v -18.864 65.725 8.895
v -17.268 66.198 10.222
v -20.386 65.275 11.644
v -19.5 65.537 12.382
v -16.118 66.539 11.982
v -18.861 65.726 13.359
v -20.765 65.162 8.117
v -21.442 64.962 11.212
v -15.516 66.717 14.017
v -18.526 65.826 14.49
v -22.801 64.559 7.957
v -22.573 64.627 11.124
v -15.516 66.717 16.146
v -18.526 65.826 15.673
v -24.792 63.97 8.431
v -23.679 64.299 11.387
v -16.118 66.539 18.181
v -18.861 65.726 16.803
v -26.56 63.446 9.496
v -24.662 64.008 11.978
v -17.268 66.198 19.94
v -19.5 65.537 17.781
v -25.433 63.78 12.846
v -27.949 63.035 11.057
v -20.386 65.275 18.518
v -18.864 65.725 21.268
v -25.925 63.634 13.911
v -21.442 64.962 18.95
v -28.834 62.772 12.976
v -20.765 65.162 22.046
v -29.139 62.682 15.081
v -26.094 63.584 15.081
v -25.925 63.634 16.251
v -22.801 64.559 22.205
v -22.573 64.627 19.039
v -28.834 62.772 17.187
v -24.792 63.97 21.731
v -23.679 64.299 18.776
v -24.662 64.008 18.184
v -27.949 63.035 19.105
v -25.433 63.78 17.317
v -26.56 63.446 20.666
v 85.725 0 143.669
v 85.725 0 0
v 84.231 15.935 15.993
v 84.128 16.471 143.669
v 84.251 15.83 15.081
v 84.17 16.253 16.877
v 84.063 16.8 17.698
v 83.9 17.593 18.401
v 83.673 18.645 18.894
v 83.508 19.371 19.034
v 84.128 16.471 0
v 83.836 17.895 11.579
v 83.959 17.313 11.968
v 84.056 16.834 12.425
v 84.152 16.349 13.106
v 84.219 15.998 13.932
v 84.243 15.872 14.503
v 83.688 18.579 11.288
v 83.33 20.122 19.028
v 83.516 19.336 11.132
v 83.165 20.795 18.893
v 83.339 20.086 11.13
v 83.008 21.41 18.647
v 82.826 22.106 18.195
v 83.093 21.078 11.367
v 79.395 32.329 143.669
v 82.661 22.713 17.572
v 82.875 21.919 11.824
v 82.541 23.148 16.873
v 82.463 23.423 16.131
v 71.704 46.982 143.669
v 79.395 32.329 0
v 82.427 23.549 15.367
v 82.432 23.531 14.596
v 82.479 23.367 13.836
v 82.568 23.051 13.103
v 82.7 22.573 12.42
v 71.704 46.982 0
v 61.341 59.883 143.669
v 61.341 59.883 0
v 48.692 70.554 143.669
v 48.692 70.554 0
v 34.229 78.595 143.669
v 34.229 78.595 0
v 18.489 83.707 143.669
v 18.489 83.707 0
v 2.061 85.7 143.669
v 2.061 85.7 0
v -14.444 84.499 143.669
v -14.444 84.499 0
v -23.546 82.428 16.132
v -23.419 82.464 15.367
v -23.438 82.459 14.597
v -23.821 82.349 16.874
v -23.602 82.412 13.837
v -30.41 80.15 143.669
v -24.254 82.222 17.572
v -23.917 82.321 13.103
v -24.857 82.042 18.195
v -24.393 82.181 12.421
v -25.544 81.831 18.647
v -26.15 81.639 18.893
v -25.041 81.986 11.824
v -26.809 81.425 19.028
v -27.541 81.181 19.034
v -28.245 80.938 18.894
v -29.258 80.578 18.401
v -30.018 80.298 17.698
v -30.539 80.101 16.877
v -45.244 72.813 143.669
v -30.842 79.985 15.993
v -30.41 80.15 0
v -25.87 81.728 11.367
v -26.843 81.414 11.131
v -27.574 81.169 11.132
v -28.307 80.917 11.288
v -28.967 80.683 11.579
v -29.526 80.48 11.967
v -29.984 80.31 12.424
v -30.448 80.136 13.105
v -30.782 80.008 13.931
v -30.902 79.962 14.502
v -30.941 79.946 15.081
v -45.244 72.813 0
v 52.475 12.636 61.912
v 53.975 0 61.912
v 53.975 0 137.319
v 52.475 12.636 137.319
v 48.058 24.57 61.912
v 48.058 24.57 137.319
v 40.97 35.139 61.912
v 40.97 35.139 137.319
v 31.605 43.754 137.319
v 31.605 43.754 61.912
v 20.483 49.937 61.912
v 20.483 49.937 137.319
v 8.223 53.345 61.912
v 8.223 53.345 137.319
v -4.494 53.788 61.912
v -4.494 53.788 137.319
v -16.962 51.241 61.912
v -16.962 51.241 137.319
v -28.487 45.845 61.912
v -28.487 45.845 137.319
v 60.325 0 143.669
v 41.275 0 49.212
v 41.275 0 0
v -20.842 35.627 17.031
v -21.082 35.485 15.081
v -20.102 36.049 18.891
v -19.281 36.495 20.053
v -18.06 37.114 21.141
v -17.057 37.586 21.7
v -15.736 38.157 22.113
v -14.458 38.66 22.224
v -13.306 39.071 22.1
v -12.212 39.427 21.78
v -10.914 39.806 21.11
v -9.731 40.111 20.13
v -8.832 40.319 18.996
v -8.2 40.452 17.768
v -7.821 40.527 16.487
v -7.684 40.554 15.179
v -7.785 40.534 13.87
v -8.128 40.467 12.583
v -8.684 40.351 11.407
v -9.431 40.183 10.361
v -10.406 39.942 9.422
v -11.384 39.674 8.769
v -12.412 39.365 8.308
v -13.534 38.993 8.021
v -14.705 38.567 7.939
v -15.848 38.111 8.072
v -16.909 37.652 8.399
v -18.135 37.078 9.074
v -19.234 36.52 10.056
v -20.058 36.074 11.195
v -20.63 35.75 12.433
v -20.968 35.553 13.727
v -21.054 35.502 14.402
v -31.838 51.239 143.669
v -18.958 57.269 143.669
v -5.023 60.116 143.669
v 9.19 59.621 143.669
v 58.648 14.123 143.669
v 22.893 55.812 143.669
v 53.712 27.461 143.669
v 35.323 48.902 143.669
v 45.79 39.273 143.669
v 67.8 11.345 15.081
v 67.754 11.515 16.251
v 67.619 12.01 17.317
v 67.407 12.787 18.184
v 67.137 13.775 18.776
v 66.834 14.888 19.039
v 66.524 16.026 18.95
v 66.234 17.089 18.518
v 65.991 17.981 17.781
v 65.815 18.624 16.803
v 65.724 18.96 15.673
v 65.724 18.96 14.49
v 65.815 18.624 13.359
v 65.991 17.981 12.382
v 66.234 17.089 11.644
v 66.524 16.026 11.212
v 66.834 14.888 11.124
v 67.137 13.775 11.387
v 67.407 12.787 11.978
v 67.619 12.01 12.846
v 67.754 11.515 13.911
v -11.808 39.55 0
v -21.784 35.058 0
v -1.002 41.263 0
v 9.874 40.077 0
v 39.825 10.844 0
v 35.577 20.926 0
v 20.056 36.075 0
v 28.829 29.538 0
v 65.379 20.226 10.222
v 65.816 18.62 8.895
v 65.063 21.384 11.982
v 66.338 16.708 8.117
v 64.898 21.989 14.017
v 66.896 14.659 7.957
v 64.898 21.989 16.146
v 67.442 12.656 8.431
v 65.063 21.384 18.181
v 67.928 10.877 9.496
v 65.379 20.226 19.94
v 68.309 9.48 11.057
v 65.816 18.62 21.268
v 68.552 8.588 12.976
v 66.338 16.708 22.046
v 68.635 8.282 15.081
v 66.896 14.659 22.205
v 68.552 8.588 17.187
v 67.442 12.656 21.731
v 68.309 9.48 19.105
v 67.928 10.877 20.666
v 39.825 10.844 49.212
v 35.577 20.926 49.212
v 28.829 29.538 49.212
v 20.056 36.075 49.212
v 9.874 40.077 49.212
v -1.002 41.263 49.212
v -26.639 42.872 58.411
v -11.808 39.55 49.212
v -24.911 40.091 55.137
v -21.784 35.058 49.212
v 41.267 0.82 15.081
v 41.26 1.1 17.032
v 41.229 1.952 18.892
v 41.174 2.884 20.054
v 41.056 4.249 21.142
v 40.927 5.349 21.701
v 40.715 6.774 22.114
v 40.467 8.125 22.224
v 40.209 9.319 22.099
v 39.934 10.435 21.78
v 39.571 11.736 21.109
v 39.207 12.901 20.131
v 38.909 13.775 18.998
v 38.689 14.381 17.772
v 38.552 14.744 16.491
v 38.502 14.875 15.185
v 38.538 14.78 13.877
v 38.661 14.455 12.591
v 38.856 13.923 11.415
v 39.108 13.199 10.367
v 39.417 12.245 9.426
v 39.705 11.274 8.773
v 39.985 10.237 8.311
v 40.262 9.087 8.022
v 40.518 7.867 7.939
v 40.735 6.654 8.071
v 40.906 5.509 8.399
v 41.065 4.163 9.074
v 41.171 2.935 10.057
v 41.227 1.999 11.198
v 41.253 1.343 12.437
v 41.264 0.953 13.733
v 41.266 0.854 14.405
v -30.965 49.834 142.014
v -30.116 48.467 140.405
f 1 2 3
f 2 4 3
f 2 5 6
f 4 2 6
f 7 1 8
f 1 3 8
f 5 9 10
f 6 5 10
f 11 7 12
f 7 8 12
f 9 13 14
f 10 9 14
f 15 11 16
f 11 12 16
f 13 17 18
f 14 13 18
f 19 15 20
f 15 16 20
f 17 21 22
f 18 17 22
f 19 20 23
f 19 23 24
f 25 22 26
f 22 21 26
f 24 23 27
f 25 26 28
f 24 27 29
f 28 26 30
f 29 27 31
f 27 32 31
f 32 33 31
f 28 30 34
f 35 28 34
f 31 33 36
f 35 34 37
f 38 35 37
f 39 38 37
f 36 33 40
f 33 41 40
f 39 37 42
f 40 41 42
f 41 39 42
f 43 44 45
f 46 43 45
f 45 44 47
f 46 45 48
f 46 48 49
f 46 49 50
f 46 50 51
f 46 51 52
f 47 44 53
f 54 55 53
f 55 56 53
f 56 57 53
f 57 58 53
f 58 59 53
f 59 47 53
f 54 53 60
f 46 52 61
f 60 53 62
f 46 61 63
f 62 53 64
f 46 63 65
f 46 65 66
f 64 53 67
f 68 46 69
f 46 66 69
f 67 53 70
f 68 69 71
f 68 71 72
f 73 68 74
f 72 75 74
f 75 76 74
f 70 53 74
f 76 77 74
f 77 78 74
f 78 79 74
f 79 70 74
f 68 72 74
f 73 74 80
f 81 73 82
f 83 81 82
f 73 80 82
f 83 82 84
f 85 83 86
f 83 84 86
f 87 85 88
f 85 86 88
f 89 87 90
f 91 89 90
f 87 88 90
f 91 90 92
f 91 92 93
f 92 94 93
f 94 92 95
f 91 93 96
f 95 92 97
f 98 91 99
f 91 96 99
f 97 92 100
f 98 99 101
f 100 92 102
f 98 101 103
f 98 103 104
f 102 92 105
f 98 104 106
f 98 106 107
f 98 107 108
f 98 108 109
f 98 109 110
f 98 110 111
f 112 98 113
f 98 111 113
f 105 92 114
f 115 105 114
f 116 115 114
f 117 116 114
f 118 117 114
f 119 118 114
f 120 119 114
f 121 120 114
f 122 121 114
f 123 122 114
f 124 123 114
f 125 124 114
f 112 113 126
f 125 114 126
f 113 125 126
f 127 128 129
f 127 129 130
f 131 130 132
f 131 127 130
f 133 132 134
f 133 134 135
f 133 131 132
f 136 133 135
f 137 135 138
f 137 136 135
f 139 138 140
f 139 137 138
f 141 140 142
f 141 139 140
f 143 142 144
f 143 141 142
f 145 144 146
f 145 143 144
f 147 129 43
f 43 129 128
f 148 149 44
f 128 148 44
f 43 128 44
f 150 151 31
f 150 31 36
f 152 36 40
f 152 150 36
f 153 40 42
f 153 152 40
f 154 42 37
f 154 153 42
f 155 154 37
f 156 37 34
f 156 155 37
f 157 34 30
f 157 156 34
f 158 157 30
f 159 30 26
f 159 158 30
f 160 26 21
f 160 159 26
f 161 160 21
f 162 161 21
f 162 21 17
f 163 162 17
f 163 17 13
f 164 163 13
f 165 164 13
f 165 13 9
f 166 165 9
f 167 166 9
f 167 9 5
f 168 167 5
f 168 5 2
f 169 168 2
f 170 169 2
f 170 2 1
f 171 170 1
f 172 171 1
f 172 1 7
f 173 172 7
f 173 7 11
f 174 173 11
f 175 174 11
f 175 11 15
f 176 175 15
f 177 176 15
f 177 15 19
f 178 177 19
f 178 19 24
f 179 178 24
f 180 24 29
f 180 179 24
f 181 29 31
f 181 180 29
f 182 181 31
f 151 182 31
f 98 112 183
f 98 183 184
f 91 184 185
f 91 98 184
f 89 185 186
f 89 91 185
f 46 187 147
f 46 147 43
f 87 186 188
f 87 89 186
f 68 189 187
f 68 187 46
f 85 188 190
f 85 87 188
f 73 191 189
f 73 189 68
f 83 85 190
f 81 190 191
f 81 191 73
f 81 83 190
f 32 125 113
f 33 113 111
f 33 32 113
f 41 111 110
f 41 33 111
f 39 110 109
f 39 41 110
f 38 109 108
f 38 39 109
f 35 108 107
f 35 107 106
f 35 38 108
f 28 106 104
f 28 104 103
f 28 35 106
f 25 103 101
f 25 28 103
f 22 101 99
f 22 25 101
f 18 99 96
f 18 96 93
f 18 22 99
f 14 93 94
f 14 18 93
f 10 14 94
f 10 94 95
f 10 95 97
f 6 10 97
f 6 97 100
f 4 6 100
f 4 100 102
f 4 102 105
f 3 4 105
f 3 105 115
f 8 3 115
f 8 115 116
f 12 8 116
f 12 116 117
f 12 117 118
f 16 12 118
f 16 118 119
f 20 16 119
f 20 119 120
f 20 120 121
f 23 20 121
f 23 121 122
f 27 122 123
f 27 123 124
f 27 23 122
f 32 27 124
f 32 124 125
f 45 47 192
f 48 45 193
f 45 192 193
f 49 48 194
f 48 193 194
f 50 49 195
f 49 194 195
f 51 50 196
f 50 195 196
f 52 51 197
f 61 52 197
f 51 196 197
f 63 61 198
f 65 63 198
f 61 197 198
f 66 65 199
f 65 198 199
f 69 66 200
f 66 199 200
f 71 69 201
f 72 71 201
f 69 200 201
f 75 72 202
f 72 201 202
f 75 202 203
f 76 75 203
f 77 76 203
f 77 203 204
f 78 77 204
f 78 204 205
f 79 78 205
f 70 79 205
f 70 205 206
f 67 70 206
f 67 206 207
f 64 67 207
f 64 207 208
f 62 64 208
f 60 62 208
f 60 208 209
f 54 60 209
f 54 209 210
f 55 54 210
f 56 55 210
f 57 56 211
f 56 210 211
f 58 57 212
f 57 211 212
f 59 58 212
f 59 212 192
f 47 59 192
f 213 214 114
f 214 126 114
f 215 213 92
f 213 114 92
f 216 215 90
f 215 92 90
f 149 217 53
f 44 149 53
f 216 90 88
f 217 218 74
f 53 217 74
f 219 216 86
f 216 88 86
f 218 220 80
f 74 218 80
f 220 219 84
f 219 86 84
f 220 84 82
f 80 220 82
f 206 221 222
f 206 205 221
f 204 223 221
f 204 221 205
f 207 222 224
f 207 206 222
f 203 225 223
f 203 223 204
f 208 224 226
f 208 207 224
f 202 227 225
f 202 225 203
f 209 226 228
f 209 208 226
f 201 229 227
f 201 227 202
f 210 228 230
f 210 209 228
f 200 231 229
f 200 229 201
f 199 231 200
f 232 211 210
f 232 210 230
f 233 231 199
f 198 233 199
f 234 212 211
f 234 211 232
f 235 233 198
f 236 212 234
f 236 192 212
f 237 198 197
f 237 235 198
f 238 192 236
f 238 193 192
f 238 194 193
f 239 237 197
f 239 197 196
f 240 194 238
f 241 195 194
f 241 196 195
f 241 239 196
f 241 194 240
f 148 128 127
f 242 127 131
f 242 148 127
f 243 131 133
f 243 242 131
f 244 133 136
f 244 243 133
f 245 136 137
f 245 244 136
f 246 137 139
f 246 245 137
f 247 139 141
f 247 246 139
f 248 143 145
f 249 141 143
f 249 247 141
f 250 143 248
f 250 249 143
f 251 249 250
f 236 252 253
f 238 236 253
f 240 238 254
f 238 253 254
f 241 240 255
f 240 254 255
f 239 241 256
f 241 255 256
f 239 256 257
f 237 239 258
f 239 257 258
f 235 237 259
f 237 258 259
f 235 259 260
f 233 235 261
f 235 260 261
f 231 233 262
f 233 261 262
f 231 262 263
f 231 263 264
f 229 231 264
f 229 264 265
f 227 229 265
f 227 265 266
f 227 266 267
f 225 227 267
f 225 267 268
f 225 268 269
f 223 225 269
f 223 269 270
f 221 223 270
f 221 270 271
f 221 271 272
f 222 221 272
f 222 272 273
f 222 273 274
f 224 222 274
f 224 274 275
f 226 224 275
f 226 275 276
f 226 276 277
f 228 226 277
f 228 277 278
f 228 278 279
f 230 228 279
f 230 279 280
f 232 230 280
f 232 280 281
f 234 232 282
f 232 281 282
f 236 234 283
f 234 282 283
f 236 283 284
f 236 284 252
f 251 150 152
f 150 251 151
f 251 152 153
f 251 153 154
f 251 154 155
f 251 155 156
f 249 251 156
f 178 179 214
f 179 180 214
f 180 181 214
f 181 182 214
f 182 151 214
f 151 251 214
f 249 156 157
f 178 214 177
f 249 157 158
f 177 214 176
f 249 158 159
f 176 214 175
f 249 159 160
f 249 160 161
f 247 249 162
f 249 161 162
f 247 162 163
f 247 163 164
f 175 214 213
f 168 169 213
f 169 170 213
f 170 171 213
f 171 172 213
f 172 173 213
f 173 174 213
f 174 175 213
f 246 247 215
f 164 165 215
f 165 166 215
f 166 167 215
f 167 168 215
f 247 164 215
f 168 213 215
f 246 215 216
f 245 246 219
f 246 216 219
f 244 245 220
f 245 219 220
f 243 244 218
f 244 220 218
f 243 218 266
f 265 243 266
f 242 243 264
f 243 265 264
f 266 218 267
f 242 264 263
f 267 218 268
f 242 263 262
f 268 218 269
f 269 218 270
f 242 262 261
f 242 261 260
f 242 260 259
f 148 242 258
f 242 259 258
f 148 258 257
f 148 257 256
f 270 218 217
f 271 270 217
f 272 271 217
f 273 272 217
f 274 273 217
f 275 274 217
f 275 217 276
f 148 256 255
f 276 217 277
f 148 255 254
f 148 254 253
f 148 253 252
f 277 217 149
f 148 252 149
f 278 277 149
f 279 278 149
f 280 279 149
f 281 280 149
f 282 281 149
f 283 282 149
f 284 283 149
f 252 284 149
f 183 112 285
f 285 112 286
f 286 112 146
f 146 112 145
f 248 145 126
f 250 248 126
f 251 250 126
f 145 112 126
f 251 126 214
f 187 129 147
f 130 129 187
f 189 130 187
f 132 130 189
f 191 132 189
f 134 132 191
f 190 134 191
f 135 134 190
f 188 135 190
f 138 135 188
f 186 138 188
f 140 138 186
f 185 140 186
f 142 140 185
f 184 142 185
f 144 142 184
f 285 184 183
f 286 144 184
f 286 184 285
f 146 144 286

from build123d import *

# Parameters (mm, degrees)
F1_DEPTH  = 143.66875
F7_R      = 3.96875
F8_DEPTH  = 76.2
F6_R      = 7.14375
F9_DEPTH  = 28.575
F11_R     = 7.14375
F13_DEPTH = 28.575
F12_R     = 3.96875
F14_DEPTH = 76.2


with BuildPart() as f1:
    # F0 (on Top) → F1 (new body)
    with BuildSketch(Plane.XY):
        with BuildLine():
            ThreePointArc((-21.784028, 35.058262), (20.056045, 36.074654), (41.275, 0))
            Line((41.275, 0), (85.725, 0))
            ThreePointArc((85.725, 0), (41.654863, 74.924282), (-45.24375, 72.813314))
            Line((-45.24375, 72.813314), (-21.784028, 35.058262))
        make_face()
    extrude(amount=F1_DEPTH)

    # F2 (on face) → F4 (revolve, cut)
    with BuildSketch(Plane(origin=(0, 0, 0), x_dir=(0.527778, -0.849382, 0), z_dir=(-0.849382, -0.527778, 0))):
        Polygon((-53.975, 61.9125), (-41.275, 49.2125), (-41.275, 143.66875), (-60.325, 143.66875), (-53.975, 137.31875), align=None)
    revolve(axis=Axis((0, 0, 45.690566), (0, 0, 1)), mode=Mode.SUBTRACT)

    # F7 (on face) → F8 (cut)
    with BuildSketch(Plane(origin=(-11.304252, 38.162514, 0), x_dir=(-0.95882, -0.284015, 0), z_dir=(-0.284015, 0.95882, 0))):
        with Locations((2.992371, 15.08125)):
            Circle(F7_R)
    extrude(amount=F8_DEPTH, mode=Mode.SUBTRACT)

    # F6 (on face) → F9 (cut)
    with BuildSketch(Plane(origin=(-11.304252, 38.162514, 0), x_dir=(-0.95882, -0.284015, 0), z_dir=(-0.284015, 0.95882, 0))):
        with Locations((2.992371, 15.08125)):
            Circle(F6_R)
    extrude(amount=F9_DEPTH, mode=Mode.SUBTRACT)

    # F11 (on face) → F13 (cut)
    with BuildSketch(Plane(origin=(38.419372, 10.474323, 0), x_dir=(0.263031, -0.964787, 0), z_dir=(-0.964787, -0.263031, 0))):
        with Locations((2.919113, 15.08125)):
            Circle(F11_R)
    extrude(amount=-F13_DEPTH, mode=Mode.SUBTRACT)

    # F12 (on face) → F14 (cut)
    with BuildSketch(Plane(origin=(38.419372, 10.474323, 0), x_dir=(0.263031, -0.964787, 0), z_dir=(-0.964787, -0.263031, 0))):
        with Locations((2.919113, 15.08125)):
            Circle(F12_R)
    extrude(amount=-F14_DEPTH, mode=Mode.SUBTRACT)


solid = f1.part
